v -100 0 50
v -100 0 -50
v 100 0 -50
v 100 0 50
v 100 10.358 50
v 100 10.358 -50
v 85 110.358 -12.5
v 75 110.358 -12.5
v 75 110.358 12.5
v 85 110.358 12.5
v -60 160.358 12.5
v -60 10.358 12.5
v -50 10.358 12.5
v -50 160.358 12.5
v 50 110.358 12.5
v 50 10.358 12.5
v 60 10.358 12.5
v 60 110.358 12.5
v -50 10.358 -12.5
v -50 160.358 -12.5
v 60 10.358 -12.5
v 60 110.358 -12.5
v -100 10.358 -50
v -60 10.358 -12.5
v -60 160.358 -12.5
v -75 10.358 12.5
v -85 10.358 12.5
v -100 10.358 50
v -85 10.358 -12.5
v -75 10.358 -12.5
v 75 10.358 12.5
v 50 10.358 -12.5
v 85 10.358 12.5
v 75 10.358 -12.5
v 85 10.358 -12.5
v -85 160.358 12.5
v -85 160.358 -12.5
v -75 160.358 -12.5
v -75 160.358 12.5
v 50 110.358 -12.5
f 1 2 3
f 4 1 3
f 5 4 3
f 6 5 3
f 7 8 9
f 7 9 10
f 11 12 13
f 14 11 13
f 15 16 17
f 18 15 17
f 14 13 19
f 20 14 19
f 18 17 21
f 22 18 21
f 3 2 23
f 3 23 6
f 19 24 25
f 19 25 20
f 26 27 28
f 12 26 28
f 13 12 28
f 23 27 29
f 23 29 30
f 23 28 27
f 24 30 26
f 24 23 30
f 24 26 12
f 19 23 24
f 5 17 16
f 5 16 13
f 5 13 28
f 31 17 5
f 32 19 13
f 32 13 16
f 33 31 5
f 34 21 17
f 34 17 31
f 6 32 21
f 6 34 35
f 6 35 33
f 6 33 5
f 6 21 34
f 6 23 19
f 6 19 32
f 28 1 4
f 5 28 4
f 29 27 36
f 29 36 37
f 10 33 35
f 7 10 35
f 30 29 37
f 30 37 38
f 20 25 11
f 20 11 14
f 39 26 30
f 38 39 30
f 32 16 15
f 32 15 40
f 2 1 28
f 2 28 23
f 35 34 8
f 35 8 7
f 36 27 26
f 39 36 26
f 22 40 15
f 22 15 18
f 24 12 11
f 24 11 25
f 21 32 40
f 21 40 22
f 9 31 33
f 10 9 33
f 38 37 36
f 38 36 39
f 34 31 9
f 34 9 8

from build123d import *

# Parameters (mm, degrees)
SKETCH2_W           = 200
SKETCH2_H           = 100
BOSS_EXTRUDE1_DEPTH = 10.357742679
SKETCH4_W           = 10
SKETCH4_H           = 25
BOSS_EXTRUDE2_DEPTH = 150
SKETCH7_W           = 10
SKETCH7_H           = 25
BOSS_EXTRUDE3_DEPTH = 100


with BuildPart() as part:
    # Sketch2 → Boss-Extrude1 (new body)
    with BuildSketch(Plane(origin=(0, 0, 0), x_dir=(1, 0, 0), z_dir=(0, 1, 0))):
        Rectangle(SKETCH2_W, SKETCH2_H)
    extrude(amount=BOSS_EXTRUDE1_DEPTH)

    # Sketch4 → Boss-Extrude2 (add)
    with BuildSketch(Plane(origin=(0, 10.357742679, 0), x_dir=(1, 0, 0), z_dir=(0, 1, 0))):
        with Locations((-80, 0)):
            Rectangle(SKETCH4_W, SKETCH4_H)
        with Locations((-55, 0)):
            Rectangle(SKETCH4_W, SKETCH4_H)
    extrude(amount=BOSS_EXTRUDE2_DEPTH)

    # Sketch7 → Boss-Extrude3 (add)
    with BuildSketch(Plane(origin=(0, 10.357742679, 0), x_dir=(1, 0, 0), z_dir=(0, 1, 0))):
        with Locations((80, 0)):
            Rectangle(SKETCH7_W, SKETCH7_H)
        with Locations((55, 0)):
            Rectangle(SKETCH7_W, SKETCH7_H)
    extrude(amount=BOSS_EXTRUDE3_DEPTH)


solid = part.part
